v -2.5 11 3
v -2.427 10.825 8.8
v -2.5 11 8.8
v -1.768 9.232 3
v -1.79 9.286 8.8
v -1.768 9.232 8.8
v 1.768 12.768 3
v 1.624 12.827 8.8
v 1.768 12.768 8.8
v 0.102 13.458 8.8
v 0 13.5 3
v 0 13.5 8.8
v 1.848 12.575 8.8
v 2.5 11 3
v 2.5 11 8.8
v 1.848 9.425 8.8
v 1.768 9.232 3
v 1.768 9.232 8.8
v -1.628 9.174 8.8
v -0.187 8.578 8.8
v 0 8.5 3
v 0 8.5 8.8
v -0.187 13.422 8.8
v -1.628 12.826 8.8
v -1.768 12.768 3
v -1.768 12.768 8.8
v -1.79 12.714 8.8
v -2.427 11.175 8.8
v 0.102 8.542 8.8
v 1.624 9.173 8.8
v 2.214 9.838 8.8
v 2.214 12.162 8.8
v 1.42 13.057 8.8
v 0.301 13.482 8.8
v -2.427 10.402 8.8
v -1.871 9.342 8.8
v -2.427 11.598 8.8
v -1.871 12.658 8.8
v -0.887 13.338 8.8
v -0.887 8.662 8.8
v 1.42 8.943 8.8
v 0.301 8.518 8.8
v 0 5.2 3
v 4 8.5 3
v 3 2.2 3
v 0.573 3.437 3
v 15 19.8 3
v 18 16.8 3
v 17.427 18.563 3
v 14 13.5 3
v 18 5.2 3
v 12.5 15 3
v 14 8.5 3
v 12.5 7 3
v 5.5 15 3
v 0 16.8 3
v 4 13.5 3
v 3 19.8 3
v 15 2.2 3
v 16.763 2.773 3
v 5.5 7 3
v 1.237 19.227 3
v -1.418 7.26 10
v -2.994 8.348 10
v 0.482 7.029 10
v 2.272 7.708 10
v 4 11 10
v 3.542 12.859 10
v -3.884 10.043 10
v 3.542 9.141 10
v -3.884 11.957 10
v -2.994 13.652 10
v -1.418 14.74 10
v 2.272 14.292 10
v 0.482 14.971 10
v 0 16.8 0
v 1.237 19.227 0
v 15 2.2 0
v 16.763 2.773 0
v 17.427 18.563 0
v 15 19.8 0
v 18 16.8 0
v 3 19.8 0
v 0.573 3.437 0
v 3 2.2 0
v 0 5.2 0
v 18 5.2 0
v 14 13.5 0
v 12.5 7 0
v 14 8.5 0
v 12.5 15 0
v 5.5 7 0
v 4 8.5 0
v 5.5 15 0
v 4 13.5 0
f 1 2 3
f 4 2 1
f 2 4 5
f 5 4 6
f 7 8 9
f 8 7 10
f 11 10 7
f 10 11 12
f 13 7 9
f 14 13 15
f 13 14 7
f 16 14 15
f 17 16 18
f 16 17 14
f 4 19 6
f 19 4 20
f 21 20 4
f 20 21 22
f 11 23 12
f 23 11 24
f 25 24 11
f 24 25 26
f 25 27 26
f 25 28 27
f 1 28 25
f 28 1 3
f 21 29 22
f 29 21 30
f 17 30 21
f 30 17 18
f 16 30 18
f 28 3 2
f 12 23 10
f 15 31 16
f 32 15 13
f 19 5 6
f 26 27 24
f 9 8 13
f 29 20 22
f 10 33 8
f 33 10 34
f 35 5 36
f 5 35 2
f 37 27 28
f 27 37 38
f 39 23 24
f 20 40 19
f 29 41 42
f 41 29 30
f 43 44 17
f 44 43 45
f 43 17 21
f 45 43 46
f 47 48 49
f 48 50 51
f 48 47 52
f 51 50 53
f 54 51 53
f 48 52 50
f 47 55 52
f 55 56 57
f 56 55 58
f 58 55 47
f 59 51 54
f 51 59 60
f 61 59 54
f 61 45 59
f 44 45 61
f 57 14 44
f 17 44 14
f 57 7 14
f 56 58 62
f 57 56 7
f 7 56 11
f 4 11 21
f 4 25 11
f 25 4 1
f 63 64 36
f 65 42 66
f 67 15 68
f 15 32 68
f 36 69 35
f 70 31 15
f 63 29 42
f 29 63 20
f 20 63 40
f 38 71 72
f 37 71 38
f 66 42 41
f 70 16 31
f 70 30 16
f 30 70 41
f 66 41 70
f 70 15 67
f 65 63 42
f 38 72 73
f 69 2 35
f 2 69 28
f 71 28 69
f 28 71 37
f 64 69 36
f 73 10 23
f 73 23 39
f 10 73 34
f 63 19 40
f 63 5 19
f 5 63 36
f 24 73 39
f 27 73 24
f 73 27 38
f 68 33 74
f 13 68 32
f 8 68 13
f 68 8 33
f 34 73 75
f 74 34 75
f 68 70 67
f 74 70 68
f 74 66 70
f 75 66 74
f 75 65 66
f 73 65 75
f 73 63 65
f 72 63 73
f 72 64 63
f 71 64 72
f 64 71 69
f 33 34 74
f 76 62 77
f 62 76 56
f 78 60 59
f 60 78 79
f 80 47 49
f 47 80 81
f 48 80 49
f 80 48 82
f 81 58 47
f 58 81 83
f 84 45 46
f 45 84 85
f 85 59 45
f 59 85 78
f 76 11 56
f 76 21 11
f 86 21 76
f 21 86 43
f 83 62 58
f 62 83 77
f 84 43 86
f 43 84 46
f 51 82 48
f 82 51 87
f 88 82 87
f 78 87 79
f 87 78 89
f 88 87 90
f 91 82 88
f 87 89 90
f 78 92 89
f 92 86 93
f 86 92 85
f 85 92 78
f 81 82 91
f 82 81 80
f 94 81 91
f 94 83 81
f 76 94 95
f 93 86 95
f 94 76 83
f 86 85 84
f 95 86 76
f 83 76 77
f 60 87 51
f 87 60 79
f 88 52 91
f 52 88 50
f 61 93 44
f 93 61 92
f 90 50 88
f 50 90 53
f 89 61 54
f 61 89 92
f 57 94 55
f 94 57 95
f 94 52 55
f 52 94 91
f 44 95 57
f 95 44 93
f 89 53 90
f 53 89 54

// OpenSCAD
// latches/loop_post.scad — loop frame on one end, T-post on the other.
// MIT licensed.
//
// Convention: end="left" places a small T-headed post UP from the band's top
// surface at x=0; end="right" places a loop-frame extending +X past the
// band end. When worn, the loop-frame slips over the T-post and the post's
// head captures it.

LOOP_POST_DIAMETER     = 5;     // mm — post shaft diameter
LOOP_POST_HEIGHT       = 7;     // mm — post total height
LOOP_POST_HEAD_R       = 4;     // mm — T-head radius (wider than shaft so the loop is captured)
LOOP_FRAME_LENGTH      = 18;    // mm — frame extends past band end
LOOP_FRAME_INNER_W     = 8;     // mm — inner cutout width (must clear post head)
LOOP_FRAME_INNER_L     = 10;    // mm — inner cutout length
LOOP_FRAME_WALL        = 2.5;   // mm

module latch_loop_post(band_width, band_thickness, end = "both") {
    if (end == "left" || end == "both") {
        // T-headed post centered on the band's top surface near x = 0
        translate([0, band_width / 2, band_thickness]) {
            cylinder(h = LOOP_POST_HEIGHT - 1.2, d = LOOP_POST_DIAMETER);
            translate([0, 0, LOOP_POST_HEIGHT - 1.2])
                cylinder(h = 1.2,
                         r1 = LOOP_POST_DIAMETER / 2,
                         r2 = LOOP_POST_HEAD_R);
        }
    }
    if (end == "right" || end == "both") {
        // Loop frame extending +X past the band end
        frame_w = band_width * 0.8;
        translate([0, (band_width - frame_w) / 2, 0])
            difference() {
                // outer rounded-rect
                linear_extrude(height = band_thickness)
                    offset(r = 3) offset(delta = -3)
                        square([LOOP_FRAME_LENGTH, frame_w]);
                // inner cutout for the loop
                translate([
                    (LOOP_FRAME_LENGTH - LOOP_FRAME_INNER_L) / 2,
                    (frame_w - LOOP_FRAME_INNER_W) / 2,
                    -0.1
                ])
                    linear_extrude(height = band_thickness + 0.2)
                        offset(r = 1.5) offset(delta = -1.5)
                            square([LOOP_FRAME_INNER_L, LOOP_FRAME_INNER_W]);
            }
    }
}

latch_loop_post(22, 3);
